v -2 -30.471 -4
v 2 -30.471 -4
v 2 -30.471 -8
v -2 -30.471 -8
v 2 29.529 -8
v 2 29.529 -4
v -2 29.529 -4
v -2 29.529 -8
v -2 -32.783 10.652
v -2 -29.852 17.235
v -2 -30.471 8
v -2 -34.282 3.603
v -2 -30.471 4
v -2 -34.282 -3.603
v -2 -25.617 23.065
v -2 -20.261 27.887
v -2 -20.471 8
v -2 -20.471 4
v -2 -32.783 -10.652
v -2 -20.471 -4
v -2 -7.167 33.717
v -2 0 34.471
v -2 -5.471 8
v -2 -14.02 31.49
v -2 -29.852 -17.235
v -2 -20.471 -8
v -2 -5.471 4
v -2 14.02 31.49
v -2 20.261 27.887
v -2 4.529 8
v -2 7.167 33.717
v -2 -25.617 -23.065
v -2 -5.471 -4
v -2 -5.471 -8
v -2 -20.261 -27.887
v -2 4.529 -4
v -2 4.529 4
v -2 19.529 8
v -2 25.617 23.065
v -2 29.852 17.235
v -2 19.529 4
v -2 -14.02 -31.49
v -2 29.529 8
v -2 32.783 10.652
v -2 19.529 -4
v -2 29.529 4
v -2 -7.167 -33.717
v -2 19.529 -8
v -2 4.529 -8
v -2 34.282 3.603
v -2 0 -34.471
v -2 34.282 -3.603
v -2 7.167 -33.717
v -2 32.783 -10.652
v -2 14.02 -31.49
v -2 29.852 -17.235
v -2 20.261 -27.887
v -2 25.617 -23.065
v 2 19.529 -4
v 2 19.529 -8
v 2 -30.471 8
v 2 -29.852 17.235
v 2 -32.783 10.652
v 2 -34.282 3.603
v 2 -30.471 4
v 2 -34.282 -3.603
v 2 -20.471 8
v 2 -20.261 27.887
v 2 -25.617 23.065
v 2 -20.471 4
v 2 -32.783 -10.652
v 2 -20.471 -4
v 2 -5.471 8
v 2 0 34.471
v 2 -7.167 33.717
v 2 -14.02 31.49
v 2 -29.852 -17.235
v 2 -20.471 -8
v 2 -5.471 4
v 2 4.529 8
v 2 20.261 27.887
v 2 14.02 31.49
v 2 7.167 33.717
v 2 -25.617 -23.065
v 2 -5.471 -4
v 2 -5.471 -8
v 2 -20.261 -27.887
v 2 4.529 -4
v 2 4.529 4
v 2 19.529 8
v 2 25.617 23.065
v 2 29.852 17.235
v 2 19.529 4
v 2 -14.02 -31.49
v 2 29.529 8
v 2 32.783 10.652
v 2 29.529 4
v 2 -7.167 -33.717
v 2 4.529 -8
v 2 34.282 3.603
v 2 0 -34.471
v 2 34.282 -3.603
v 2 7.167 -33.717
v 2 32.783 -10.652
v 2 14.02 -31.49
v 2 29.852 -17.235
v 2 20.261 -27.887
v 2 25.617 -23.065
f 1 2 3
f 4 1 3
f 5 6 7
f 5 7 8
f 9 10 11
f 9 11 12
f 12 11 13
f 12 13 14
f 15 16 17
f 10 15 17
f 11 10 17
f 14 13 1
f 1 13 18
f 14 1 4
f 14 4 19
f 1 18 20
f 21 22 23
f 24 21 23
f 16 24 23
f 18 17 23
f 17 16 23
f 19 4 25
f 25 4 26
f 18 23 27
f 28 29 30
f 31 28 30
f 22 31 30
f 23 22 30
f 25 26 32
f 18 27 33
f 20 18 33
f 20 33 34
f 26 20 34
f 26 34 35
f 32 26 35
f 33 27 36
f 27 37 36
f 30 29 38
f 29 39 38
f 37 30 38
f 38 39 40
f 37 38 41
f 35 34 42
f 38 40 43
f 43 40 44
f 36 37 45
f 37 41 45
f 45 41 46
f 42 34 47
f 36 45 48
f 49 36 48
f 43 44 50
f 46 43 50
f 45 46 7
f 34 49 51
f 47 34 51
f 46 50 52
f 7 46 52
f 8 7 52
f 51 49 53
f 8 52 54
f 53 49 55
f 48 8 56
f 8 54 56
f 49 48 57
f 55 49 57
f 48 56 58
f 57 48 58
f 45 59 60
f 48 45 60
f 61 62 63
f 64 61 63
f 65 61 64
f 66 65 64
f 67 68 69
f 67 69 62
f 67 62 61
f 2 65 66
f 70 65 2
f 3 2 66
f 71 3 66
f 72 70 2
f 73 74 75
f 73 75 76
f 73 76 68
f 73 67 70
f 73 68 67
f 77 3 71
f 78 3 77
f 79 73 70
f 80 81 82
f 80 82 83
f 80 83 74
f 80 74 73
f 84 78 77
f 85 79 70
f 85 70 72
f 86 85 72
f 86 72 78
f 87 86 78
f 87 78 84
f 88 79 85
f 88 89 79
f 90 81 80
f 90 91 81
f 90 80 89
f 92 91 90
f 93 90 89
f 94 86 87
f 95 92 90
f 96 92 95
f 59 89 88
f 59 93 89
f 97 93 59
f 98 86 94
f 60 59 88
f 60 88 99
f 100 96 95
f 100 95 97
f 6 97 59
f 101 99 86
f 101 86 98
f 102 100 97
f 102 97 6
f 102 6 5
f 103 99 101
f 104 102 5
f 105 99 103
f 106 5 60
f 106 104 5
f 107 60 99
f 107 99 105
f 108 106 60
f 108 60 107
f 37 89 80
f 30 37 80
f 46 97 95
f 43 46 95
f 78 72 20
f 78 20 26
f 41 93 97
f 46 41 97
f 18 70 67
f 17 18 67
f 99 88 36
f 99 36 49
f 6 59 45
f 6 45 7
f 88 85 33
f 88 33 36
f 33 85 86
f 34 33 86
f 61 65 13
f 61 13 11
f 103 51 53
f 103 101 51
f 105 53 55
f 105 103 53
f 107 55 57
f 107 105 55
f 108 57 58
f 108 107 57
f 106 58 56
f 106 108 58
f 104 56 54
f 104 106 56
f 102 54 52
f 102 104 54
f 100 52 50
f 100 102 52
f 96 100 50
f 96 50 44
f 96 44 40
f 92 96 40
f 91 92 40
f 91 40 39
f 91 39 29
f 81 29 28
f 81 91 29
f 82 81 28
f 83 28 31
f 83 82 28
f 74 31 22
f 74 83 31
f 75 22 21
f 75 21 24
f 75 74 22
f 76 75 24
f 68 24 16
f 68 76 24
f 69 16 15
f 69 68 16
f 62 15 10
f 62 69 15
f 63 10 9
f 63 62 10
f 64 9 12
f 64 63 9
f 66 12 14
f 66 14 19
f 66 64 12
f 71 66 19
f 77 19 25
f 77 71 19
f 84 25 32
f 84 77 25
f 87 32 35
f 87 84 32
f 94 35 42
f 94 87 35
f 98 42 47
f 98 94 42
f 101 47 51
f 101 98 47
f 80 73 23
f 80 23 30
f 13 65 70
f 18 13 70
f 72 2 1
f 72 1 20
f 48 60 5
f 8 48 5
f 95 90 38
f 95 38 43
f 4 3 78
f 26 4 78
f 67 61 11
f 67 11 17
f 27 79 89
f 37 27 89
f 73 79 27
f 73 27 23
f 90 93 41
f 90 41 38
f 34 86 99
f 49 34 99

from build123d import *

# Parameters (mm, degrees)
SKETCH1_R           = 34.470588235
BOSS_EXTRUDE1_DEPTH = 2
SKETCH2_W           = 4
SKETCH2_H           = 10
CUT_EXTRUDE1_DEPTH  = 49.912604782


with BuildPart() as part:
    # Sketch1 → Boss-Extrude1 (new, symmetric)
    with BuildSketch(Plane(origin=(0, 0, 0), x_dir=(0, 0, -1), z_dir=(1, 0, 0))):
        Circle(SKETCH1_R)
    extrude(amount=BOSS_EXTRUDE1_DEPTH, both=True)

    # Sketch2 → Cut-Extrude1 (cut, through all)
    with BuildSketch(Plane(origin=(2, 0, 0), x_dir=(0, 0, -1), z_dir=(1, 0, 0))):
        with Locations((6, 24.529411765)):
            Rectangle(SKETCH2_W, SKETCH2_H)
        with Locations((6, -0.470588235)):
            Rectangle(SKETCH2_W, SKETCH2_H)
        with Locations((6, -25.470588235)):
            Rectangle(SKETCH2_W, SKETCH2_H)
    cut_extrude1 = extrude(amount=-CUT_EXTRUDE1_DEPTH, mode=Mode.SUBTRACT)

    # Mirror1: Cut-Extrude1 across plane
    add(cut_extrude1.mirror(Plane.XY), mode=Mode.SUBTRACT)


solid = part.part
